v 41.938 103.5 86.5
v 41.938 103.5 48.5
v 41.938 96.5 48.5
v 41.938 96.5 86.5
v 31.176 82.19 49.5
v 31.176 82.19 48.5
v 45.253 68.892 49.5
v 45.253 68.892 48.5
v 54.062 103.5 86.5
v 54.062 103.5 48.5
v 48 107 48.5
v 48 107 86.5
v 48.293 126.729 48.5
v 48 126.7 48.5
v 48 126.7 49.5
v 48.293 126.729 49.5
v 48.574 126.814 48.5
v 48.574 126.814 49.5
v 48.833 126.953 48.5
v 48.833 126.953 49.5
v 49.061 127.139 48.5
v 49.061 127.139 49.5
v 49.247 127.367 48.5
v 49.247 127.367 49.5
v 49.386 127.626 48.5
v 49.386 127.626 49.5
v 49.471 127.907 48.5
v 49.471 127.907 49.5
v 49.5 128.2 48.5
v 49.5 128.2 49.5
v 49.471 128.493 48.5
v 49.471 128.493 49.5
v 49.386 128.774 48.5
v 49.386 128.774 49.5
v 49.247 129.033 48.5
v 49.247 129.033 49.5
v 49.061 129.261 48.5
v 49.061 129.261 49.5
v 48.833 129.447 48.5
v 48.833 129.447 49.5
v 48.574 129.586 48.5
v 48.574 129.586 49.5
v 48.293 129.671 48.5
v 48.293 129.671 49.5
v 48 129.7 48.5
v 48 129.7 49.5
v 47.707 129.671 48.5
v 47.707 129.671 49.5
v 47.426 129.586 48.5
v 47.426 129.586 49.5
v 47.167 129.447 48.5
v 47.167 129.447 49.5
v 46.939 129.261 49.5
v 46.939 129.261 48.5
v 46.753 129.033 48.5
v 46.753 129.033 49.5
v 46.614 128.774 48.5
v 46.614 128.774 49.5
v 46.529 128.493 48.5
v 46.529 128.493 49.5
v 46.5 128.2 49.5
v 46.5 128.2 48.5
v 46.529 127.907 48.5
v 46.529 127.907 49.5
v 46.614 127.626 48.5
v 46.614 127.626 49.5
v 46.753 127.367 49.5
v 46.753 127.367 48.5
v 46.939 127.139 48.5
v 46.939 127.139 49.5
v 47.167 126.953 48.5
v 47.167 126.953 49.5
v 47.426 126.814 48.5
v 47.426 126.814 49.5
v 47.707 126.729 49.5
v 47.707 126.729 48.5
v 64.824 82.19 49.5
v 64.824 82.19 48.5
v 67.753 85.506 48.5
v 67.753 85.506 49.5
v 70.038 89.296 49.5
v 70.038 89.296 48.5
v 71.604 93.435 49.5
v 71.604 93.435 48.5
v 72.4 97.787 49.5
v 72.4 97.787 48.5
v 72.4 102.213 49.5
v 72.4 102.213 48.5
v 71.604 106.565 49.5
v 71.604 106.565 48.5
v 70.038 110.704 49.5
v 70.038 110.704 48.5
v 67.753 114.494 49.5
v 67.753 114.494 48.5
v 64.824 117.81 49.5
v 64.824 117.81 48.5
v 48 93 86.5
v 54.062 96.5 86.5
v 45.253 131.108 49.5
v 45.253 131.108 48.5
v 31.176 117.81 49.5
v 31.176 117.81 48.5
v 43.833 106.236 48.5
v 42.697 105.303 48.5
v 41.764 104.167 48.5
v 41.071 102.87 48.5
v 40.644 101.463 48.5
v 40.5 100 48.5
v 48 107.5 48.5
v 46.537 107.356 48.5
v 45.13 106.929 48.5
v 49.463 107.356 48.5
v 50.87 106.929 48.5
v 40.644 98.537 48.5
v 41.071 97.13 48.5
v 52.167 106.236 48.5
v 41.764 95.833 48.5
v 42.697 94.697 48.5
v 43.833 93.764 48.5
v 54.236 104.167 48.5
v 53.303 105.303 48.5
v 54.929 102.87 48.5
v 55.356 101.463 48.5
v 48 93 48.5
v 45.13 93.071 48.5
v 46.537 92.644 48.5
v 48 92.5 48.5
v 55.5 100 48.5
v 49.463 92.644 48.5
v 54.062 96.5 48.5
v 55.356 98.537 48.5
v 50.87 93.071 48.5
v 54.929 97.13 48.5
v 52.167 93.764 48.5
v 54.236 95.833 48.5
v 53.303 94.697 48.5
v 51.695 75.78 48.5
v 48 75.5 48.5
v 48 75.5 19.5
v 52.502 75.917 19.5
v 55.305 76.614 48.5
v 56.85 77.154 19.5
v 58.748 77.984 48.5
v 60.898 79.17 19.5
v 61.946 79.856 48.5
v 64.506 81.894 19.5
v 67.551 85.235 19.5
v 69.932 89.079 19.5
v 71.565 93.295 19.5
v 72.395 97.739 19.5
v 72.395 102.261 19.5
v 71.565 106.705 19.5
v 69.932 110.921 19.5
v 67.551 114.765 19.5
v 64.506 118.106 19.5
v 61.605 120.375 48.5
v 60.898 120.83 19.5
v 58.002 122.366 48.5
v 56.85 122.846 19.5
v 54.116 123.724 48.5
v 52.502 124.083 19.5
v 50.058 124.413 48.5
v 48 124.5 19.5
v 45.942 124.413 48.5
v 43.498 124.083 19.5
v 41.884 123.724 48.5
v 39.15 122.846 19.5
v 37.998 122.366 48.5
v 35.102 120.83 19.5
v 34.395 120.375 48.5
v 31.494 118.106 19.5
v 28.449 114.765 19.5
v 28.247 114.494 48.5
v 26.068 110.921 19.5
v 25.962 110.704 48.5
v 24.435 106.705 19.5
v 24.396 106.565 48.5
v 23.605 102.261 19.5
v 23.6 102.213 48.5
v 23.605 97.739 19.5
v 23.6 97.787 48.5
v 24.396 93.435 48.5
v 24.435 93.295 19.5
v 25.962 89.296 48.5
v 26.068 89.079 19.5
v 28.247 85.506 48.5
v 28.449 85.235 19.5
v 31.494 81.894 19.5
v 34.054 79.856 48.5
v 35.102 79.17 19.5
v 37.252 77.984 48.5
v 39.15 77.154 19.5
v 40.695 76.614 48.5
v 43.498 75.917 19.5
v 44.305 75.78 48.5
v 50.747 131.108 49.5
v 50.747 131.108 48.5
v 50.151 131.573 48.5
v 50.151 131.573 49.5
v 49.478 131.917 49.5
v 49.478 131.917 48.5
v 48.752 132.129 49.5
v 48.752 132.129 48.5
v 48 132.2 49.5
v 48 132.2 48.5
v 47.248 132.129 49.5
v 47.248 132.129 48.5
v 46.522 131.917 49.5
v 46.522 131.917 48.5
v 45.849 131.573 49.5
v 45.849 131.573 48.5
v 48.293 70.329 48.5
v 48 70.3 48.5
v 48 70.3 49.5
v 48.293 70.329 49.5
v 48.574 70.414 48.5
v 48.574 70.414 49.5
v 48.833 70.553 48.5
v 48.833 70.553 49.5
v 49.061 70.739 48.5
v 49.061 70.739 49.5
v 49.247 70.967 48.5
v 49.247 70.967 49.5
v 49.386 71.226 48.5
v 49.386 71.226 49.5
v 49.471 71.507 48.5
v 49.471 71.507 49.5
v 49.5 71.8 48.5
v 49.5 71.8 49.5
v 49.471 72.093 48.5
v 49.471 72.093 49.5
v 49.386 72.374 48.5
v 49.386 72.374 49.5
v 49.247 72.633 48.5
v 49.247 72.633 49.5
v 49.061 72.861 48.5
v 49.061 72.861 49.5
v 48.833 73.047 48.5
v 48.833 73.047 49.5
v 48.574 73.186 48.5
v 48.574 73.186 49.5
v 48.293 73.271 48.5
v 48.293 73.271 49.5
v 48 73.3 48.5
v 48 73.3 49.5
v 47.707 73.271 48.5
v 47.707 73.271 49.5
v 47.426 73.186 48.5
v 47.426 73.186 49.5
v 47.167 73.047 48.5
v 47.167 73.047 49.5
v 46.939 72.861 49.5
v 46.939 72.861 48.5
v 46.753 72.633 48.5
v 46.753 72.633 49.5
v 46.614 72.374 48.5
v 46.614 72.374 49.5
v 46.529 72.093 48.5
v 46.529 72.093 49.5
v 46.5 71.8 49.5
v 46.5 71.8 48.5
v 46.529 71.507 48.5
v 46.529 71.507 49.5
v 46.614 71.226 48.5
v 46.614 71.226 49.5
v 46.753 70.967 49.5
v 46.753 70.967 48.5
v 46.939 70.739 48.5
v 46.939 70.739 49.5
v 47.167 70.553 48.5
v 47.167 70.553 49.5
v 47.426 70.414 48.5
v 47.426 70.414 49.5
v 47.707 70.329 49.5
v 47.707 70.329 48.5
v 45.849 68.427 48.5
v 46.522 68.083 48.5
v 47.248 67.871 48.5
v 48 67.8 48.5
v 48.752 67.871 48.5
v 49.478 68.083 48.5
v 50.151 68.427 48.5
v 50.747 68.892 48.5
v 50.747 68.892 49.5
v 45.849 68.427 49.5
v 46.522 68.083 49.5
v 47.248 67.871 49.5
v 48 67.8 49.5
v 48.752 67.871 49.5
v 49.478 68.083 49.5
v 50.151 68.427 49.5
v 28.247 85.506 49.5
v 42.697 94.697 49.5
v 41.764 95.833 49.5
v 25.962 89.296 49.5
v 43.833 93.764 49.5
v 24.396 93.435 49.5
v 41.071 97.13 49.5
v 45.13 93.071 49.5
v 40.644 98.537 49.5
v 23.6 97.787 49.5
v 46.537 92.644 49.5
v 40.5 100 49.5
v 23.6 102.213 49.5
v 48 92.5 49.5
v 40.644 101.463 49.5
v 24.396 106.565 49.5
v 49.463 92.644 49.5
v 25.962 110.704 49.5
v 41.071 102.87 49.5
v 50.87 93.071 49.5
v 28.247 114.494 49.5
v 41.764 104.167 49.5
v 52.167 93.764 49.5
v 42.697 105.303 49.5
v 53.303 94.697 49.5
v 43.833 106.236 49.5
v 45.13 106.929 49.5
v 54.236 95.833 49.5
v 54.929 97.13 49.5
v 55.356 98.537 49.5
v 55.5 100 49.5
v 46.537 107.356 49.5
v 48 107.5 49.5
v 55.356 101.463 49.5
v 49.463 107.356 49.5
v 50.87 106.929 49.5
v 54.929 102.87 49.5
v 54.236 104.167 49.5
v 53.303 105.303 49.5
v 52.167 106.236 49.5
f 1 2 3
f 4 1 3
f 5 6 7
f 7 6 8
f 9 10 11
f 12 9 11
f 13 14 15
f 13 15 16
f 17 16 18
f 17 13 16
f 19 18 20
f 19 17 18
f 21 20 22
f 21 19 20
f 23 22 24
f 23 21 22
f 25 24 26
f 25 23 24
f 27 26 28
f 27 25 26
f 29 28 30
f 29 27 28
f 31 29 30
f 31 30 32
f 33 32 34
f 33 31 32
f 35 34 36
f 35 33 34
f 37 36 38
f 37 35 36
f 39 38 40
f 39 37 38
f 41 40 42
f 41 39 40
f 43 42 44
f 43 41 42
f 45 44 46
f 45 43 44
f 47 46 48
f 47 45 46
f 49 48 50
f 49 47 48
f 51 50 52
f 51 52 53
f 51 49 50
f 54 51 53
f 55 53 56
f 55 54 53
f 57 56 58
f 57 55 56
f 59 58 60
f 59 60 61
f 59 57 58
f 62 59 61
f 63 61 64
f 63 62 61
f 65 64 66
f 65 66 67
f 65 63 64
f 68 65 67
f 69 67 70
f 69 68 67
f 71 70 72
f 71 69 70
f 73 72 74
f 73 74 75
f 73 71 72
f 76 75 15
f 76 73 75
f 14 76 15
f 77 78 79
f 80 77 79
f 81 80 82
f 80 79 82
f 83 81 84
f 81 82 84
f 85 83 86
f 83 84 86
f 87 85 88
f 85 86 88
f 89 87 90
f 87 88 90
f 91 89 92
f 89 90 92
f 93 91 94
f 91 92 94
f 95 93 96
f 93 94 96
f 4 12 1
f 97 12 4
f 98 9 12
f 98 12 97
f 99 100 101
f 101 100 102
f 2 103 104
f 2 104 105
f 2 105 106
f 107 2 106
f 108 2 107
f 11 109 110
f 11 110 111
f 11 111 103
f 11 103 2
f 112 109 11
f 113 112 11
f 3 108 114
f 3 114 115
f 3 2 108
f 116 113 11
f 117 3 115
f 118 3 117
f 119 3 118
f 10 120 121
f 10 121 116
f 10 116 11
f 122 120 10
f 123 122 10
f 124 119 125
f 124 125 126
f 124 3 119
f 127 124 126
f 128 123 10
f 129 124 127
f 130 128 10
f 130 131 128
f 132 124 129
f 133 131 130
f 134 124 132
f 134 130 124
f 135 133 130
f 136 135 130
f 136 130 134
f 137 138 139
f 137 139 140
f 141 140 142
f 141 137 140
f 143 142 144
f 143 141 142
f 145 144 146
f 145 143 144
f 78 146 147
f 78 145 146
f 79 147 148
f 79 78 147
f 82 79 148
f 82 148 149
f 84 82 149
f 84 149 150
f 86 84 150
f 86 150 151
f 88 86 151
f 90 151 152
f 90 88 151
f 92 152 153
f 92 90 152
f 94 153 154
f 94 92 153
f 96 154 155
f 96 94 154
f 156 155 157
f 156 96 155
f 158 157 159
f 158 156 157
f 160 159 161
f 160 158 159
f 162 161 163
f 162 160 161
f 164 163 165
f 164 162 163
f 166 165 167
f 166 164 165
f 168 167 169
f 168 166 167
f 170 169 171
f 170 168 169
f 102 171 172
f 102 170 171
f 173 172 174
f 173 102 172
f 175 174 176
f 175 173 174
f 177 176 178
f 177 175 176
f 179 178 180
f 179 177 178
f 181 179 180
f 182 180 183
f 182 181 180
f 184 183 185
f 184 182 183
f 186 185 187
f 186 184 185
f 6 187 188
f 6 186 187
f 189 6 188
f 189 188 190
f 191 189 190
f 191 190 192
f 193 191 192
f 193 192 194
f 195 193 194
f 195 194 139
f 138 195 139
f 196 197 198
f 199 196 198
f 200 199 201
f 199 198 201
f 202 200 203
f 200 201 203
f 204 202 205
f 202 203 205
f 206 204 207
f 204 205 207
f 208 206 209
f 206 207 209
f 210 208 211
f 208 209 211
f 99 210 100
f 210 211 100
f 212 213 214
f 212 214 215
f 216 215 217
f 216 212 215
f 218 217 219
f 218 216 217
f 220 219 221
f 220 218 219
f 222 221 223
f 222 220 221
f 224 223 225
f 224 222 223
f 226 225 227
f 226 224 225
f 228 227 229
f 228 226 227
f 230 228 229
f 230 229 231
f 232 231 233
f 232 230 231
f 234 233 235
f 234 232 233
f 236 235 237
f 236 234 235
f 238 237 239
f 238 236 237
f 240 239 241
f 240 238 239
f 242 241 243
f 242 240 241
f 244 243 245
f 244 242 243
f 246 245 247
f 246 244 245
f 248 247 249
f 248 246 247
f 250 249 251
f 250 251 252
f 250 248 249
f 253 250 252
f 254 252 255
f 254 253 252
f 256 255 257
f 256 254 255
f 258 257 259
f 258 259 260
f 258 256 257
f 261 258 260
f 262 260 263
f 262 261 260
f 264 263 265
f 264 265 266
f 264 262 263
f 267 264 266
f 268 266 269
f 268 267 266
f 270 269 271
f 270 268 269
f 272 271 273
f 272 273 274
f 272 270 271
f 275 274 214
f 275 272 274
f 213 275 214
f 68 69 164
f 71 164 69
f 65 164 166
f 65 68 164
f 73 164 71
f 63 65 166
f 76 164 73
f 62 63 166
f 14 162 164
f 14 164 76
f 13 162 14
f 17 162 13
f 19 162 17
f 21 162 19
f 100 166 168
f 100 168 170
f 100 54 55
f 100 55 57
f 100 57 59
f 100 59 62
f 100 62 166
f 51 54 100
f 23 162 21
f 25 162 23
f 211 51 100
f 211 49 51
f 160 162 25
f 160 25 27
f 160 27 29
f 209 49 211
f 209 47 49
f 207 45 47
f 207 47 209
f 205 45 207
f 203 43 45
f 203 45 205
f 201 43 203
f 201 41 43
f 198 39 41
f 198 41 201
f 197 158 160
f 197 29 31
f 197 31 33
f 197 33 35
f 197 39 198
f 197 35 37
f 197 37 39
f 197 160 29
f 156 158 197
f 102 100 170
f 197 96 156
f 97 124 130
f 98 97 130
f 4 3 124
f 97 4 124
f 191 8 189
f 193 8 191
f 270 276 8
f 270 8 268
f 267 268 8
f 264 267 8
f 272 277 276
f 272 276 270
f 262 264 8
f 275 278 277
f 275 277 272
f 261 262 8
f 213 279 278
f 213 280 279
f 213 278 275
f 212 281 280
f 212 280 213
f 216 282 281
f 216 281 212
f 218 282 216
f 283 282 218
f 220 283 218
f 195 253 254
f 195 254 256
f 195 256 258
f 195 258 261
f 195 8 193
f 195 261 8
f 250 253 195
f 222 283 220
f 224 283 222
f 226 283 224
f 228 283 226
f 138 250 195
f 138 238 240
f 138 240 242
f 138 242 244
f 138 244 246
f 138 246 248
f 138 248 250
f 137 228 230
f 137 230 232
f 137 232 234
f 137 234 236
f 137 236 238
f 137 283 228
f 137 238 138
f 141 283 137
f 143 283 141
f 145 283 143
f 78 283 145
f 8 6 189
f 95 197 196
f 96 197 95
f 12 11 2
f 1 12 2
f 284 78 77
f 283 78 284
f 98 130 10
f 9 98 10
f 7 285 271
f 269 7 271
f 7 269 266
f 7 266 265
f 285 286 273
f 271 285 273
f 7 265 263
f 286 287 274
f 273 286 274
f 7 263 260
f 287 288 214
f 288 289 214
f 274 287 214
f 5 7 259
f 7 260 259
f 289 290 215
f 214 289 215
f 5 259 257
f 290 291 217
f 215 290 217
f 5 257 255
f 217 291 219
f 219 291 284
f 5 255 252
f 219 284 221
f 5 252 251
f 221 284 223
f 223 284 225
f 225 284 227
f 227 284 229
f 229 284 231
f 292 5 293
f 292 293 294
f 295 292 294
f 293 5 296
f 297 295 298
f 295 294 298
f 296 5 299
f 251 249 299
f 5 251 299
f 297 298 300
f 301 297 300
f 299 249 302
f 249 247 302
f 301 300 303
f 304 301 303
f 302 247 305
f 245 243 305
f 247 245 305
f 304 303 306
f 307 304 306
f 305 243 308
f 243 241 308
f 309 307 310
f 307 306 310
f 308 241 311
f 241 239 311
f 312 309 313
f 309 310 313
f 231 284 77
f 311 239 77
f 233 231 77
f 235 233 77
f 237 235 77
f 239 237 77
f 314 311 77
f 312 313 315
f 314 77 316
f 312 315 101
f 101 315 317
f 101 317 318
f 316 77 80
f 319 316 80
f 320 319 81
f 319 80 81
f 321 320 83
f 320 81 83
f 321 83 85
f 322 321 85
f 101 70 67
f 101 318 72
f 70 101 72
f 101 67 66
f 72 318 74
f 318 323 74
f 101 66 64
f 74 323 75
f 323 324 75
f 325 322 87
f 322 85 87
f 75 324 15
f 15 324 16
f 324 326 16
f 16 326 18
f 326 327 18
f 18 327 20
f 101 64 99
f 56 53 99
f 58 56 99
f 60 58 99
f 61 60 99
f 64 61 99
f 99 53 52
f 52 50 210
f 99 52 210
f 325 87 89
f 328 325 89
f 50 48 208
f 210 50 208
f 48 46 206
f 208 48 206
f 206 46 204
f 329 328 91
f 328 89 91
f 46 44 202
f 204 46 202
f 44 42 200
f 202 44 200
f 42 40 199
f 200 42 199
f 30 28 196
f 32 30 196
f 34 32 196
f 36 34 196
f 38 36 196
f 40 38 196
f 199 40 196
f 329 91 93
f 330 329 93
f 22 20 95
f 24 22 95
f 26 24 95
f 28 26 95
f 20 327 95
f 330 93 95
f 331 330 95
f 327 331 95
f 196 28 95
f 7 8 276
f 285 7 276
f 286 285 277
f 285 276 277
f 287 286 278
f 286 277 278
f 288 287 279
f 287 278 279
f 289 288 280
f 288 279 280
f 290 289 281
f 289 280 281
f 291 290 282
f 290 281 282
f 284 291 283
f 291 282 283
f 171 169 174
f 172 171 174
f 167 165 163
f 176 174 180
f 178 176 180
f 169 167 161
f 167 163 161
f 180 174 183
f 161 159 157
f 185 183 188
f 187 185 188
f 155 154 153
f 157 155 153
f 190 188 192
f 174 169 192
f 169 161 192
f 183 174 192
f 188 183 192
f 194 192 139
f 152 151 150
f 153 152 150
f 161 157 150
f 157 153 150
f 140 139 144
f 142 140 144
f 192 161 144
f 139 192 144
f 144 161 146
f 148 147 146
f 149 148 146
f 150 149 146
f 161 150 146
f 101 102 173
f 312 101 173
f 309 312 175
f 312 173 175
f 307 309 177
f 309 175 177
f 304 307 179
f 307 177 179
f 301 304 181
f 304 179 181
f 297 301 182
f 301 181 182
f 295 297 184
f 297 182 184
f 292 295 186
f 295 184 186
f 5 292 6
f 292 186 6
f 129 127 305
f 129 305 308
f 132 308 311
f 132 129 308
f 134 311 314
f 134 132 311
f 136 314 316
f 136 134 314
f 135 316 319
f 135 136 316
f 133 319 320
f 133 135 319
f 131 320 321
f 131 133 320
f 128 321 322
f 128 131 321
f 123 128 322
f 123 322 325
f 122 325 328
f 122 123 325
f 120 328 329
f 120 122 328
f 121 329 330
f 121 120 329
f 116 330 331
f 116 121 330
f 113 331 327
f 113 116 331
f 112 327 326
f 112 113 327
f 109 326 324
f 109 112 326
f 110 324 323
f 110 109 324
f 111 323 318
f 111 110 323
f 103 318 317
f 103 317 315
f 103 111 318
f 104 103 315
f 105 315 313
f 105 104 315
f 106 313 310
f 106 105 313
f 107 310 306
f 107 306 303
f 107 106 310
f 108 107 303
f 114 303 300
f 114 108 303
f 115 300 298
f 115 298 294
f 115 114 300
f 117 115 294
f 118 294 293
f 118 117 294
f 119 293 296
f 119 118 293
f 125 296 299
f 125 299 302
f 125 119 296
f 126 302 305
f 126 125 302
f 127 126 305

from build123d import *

# Parameters (mm, degrees)
SKETCH033_R             = 24.5
PAD011_DEPTH            = 29
SKETCH034_R             = 7.5
SKETCH034_R_2           = 1.5
PAD012_DEPTH            = 1
PAD013_DEPTH            = 38
BODY012_PLACEMENT_ANGLE = 90


with BuildPart() as part:
    # Sketch033 → Pad011 (new body)
    with BuildSketch(Plane.XY):
        Circle(SKETCH033_R)
    extrude(amount=-PAD011_DEPTH)

    # Sketch034 (on Face2 of Pad011) → Pad012 (join)
    with BuildSketch(Plane.XY):
        with BuildLine():
            Line((-31.107801, 2.74676), (-17.810284, 16.823905))
            ThreePointArc((17.810283, 16.823906), (-1e-06, 24.5), (-17.810284, 16.823905))
            Line((17.810283, 16.823906), (31.107801, 2.74676))
            ThreePointArc((31.107801, -2.74676), (32.2, 0), (31.107801, 2.74676))
            Line((17.810284, -16.823905), (31.107801, -2.74676))
            ThreePointArc((-17.810283, -16.823906), (1e-06, -24.5), (17.810284, -16.823905))
            Line((-31.107801, -2.74676), (-17.810283, -16.823906))
            ThreePointArc((-31.107801, 2.74676), (-32.2, 0), (-31.107801, -2.74676))
        make_face()
        Circle(SKETCH034_R, mode=Mode.SUBTRACT)
        with Locations((-28.2, 0)):
            Circle(SKETCH034_R_2, mode=Mode.SUBTRACT)
        with Locations((28.2, 0)):
            Circle(SKETCH034_R_2, mode=Mode.SUBTRACT)
    extrude(amount=PAD012_DEPTH)

    # Sketch035 (on Face17 of Pad012) → Pad013 (join)
    with BuildSketch(Plane.XY):
        Polygon((3.5, -6.062178), (7, 0), (3.5, 6.062178), (-3.5, 6.062178), (-7, 0), (-3.5, -6.062178), align=None)
    extrude(amount=PAD013_DEPTH)


with BuildPart() as part_1:
    # Body012 placement: moved
    add(part.part.moved(Location((48, 100, 48.5))).rotate(Axis((48, 100, 48.5), (0, 0, -1)), BODY012_PLACEMENT_ANGLE))


solid = part_1.part
